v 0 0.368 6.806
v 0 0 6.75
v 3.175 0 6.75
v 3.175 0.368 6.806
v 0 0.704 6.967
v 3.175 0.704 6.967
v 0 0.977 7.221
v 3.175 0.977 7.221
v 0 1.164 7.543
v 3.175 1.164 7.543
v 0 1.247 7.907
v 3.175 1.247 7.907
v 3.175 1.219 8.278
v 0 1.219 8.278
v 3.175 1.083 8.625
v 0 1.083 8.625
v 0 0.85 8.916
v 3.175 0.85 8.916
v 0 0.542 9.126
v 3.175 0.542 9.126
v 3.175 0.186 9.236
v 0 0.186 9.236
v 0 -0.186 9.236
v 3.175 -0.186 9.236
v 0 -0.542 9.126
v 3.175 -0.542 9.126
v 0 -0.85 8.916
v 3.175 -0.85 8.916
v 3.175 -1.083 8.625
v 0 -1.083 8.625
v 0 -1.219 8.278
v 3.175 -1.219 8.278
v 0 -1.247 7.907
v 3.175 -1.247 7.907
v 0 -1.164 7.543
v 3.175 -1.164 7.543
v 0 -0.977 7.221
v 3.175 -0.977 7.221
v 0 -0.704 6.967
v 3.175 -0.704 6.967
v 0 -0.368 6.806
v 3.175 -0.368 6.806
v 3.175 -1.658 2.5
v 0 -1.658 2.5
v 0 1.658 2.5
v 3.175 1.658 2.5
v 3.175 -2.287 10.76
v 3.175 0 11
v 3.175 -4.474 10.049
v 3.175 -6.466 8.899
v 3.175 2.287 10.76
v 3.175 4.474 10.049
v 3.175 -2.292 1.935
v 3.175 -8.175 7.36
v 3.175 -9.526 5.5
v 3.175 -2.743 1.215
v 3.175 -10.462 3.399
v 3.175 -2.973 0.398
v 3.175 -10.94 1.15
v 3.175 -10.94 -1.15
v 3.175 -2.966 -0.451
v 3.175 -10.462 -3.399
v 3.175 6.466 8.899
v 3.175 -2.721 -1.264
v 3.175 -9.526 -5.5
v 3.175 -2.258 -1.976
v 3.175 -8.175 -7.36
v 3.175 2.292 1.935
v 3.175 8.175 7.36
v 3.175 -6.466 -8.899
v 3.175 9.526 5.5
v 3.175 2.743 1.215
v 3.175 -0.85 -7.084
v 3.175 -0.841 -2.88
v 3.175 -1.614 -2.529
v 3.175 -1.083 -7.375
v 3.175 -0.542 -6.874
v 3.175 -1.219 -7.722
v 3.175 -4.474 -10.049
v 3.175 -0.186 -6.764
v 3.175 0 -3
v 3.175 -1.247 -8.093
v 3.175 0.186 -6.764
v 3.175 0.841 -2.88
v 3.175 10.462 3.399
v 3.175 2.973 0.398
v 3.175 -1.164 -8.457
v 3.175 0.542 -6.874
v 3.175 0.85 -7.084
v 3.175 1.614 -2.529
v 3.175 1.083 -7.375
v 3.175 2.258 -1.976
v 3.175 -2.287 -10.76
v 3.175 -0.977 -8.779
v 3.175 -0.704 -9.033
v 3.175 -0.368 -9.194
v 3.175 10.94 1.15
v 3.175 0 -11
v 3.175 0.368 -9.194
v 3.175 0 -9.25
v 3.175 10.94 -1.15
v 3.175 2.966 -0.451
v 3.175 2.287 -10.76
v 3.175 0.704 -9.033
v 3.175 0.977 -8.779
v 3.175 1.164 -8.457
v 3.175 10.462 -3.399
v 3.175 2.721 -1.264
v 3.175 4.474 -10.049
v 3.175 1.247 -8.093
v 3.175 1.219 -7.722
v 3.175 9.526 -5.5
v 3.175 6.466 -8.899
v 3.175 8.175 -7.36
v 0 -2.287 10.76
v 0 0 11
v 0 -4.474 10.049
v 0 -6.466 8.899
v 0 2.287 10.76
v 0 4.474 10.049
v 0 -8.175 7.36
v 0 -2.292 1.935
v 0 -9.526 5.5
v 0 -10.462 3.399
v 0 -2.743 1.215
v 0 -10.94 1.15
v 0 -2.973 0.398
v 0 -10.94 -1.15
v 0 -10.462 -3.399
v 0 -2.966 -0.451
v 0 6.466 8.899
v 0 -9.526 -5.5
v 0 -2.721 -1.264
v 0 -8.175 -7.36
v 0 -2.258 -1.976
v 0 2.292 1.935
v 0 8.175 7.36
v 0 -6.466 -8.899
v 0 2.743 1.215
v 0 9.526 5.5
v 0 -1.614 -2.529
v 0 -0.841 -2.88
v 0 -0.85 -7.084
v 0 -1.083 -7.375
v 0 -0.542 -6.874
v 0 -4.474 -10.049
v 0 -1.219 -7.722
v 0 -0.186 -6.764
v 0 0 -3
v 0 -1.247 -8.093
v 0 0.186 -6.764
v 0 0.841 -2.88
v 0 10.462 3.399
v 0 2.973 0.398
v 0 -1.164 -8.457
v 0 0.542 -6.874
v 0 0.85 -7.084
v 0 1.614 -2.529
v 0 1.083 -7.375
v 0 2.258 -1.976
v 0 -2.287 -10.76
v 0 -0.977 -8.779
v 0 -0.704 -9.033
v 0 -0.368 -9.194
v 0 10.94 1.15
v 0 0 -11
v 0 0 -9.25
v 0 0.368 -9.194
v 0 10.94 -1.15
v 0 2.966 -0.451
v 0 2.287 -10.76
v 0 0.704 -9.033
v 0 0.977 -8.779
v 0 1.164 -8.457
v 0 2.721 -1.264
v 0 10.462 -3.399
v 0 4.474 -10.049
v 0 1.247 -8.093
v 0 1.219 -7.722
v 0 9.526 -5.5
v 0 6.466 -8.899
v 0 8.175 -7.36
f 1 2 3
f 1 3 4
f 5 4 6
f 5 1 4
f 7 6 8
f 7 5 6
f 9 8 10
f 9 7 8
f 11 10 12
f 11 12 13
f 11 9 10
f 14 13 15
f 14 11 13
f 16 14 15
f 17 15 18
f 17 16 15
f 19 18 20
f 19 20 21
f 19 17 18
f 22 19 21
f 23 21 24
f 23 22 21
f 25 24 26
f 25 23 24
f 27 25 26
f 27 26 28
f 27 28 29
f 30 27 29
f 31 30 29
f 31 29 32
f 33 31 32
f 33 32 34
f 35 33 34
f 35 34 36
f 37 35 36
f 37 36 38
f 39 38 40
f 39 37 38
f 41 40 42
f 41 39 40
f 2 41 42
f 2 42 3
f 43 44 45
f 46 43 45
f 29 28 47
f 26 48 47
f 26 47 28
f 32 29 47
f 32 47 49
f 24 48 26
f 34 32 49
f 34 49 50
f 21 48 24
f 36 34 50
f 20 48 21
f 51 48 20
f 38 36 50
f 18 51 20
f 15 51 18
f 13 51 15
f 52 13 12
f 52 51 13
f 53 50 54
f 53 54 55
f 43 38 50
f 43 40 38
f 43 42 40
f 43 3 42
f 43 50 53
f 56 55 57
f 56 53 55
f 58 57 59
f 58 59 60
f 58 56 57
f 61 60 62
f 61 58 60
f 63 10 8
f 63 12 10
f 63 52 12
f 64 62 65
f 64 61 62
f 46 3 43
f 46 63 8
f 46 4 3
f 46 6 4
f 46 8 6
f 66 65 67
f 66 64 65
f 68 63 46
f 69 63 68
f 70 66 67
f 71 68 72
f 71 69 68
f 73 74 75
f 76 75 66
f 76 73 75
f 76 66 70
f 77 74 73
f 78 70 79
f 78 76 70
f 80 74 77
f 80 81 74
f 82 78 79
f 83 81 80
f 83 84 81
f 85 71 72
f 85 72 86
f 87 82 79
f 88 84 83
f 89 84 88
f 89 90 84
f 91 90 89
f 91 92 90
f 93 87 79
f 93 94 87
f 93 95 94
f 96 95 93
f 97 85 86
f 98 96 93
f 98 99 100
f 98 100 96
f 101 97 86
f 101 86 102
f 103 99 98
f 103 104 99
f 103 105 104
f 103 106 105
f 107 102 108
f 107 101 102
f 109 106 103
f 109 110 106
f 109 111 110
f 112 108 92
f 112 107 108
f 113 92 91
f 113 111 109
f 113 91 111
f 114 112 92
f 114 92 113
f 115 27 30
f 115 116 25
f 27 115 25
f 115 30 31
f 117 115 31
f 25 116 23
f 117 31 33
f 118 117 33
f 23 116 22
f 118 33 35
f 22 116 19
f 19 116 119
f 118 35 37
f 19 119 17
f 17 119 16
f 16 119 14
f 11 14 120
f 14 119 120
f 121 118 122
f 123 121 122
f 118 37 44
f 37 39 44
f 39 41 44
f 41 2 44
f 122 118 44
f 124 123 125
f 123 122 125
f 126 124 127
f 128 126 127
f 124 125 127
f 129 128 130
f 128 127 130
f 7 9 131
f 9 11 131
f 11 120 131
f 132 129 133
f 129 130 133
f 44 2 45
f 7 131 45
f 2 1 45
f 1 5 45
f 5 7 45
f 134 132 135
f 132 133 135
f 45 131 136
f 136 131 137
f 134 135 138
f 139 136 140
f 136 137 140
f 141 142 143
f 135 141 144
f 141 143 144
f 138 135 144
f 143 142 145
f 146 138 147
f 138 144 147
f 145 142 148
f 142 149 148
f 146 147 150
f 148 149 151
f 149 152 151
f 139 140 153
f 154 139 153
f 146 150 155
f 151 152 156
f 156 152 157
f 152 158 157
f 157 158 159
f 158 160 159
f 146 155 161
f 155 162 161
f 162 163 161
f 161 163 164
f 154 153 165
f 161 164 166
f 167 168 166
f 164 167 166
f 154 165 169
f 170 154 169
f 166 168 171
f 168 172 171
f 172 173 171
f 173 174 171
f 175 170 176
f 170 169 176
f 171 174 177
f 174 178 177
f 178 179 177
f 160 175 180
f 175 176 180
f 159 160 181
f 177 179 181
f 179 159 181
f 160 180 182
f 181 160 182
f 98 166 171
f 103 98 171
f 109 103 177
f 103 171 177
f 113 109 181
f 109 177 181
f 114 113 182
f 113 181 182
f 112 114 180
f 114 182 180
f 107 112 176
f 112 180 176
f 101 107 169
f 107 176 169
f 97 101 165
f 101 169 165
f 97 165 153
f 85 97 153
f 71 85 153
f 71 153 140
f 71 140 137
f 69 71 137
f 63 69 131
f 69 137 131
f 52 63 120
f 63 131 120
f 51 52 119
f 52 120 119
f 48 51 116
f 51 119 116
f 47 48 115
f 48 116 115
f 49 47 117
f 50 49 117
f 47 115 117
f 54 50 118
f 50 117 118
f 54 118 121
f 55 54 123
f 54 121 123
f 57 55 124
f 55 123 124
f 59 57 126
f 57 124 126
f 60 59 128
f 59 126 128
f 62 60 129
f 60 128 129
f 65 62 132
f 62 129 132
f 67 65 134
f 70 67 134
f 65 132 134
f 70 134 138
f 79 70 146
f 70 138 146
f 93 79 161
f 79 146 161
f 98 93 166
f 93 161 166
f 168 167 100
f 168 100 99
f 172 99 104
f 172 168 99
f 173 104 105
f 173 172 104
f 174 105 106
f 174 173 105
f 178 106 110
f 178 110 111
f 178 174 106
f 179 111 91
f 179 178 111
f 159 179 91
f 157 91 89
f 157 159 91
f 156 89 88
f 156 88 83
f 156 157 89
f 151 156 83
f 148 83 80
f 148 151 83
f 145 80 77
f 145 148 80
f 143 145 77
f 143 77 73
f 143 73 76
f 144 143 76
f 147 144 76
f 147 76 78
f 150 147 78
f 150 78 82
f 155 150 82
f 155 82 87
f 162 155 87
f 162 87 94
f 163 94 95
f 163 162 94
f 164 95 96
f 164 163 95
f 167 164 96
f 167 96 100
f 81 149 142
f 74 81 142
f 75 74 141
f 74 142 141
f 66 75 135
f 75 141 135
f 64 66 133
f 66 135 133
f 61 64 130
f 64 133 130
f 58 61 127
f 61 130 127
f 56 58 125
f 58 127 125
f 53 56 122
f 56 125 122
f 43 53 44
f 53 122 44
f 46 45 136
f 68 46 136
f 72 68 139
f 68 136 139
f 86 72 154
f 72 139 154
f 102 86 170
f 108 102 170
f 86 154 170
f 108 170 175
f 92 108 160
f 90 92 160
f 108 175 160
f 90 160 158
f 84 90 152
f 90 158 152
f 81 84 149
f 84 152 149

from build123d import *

# Parameters (mm, degrees)
SKETCH1_R           = 11
SKETCH1_R_2         = 1.25
BOSS_EXTRUDE1_DEPTH = 3.175


with BuildPart() as part:
    # Sketch1 → Boss-Extrude1 (new body)
    with BuildSketch(Plane(origin=(0, 0, 0), x_dir=(0, 0, -1), z_dir=(1, 0, 0))):
        Circle(SKETCH1_R)
        with BuildLine():
            Line((-2.5, -1.658312395), (-2.5, 1.658312395))
            ThreePointArc((-2.5, 1.658312395), (0.866025404, 2.872281323), (3, 0))
            ThreePointArc((3, 0), (0.866025404, -2.872281323), (-2.5, -1.658312395))
        make_face(mode=Mode.SUBTRACT)
        with Locations((-8, 0)):
            Circle(SKETCH1_R_2, mode=Mode.SUBTRACT)
        with Locations((8, 0)):
            Circle(SKETCH1_R_2, mode=Mode.SUBTRACT)
    extrude(amount=BOSS_EXTRUDE1_DEPTH)


solid = part.part
